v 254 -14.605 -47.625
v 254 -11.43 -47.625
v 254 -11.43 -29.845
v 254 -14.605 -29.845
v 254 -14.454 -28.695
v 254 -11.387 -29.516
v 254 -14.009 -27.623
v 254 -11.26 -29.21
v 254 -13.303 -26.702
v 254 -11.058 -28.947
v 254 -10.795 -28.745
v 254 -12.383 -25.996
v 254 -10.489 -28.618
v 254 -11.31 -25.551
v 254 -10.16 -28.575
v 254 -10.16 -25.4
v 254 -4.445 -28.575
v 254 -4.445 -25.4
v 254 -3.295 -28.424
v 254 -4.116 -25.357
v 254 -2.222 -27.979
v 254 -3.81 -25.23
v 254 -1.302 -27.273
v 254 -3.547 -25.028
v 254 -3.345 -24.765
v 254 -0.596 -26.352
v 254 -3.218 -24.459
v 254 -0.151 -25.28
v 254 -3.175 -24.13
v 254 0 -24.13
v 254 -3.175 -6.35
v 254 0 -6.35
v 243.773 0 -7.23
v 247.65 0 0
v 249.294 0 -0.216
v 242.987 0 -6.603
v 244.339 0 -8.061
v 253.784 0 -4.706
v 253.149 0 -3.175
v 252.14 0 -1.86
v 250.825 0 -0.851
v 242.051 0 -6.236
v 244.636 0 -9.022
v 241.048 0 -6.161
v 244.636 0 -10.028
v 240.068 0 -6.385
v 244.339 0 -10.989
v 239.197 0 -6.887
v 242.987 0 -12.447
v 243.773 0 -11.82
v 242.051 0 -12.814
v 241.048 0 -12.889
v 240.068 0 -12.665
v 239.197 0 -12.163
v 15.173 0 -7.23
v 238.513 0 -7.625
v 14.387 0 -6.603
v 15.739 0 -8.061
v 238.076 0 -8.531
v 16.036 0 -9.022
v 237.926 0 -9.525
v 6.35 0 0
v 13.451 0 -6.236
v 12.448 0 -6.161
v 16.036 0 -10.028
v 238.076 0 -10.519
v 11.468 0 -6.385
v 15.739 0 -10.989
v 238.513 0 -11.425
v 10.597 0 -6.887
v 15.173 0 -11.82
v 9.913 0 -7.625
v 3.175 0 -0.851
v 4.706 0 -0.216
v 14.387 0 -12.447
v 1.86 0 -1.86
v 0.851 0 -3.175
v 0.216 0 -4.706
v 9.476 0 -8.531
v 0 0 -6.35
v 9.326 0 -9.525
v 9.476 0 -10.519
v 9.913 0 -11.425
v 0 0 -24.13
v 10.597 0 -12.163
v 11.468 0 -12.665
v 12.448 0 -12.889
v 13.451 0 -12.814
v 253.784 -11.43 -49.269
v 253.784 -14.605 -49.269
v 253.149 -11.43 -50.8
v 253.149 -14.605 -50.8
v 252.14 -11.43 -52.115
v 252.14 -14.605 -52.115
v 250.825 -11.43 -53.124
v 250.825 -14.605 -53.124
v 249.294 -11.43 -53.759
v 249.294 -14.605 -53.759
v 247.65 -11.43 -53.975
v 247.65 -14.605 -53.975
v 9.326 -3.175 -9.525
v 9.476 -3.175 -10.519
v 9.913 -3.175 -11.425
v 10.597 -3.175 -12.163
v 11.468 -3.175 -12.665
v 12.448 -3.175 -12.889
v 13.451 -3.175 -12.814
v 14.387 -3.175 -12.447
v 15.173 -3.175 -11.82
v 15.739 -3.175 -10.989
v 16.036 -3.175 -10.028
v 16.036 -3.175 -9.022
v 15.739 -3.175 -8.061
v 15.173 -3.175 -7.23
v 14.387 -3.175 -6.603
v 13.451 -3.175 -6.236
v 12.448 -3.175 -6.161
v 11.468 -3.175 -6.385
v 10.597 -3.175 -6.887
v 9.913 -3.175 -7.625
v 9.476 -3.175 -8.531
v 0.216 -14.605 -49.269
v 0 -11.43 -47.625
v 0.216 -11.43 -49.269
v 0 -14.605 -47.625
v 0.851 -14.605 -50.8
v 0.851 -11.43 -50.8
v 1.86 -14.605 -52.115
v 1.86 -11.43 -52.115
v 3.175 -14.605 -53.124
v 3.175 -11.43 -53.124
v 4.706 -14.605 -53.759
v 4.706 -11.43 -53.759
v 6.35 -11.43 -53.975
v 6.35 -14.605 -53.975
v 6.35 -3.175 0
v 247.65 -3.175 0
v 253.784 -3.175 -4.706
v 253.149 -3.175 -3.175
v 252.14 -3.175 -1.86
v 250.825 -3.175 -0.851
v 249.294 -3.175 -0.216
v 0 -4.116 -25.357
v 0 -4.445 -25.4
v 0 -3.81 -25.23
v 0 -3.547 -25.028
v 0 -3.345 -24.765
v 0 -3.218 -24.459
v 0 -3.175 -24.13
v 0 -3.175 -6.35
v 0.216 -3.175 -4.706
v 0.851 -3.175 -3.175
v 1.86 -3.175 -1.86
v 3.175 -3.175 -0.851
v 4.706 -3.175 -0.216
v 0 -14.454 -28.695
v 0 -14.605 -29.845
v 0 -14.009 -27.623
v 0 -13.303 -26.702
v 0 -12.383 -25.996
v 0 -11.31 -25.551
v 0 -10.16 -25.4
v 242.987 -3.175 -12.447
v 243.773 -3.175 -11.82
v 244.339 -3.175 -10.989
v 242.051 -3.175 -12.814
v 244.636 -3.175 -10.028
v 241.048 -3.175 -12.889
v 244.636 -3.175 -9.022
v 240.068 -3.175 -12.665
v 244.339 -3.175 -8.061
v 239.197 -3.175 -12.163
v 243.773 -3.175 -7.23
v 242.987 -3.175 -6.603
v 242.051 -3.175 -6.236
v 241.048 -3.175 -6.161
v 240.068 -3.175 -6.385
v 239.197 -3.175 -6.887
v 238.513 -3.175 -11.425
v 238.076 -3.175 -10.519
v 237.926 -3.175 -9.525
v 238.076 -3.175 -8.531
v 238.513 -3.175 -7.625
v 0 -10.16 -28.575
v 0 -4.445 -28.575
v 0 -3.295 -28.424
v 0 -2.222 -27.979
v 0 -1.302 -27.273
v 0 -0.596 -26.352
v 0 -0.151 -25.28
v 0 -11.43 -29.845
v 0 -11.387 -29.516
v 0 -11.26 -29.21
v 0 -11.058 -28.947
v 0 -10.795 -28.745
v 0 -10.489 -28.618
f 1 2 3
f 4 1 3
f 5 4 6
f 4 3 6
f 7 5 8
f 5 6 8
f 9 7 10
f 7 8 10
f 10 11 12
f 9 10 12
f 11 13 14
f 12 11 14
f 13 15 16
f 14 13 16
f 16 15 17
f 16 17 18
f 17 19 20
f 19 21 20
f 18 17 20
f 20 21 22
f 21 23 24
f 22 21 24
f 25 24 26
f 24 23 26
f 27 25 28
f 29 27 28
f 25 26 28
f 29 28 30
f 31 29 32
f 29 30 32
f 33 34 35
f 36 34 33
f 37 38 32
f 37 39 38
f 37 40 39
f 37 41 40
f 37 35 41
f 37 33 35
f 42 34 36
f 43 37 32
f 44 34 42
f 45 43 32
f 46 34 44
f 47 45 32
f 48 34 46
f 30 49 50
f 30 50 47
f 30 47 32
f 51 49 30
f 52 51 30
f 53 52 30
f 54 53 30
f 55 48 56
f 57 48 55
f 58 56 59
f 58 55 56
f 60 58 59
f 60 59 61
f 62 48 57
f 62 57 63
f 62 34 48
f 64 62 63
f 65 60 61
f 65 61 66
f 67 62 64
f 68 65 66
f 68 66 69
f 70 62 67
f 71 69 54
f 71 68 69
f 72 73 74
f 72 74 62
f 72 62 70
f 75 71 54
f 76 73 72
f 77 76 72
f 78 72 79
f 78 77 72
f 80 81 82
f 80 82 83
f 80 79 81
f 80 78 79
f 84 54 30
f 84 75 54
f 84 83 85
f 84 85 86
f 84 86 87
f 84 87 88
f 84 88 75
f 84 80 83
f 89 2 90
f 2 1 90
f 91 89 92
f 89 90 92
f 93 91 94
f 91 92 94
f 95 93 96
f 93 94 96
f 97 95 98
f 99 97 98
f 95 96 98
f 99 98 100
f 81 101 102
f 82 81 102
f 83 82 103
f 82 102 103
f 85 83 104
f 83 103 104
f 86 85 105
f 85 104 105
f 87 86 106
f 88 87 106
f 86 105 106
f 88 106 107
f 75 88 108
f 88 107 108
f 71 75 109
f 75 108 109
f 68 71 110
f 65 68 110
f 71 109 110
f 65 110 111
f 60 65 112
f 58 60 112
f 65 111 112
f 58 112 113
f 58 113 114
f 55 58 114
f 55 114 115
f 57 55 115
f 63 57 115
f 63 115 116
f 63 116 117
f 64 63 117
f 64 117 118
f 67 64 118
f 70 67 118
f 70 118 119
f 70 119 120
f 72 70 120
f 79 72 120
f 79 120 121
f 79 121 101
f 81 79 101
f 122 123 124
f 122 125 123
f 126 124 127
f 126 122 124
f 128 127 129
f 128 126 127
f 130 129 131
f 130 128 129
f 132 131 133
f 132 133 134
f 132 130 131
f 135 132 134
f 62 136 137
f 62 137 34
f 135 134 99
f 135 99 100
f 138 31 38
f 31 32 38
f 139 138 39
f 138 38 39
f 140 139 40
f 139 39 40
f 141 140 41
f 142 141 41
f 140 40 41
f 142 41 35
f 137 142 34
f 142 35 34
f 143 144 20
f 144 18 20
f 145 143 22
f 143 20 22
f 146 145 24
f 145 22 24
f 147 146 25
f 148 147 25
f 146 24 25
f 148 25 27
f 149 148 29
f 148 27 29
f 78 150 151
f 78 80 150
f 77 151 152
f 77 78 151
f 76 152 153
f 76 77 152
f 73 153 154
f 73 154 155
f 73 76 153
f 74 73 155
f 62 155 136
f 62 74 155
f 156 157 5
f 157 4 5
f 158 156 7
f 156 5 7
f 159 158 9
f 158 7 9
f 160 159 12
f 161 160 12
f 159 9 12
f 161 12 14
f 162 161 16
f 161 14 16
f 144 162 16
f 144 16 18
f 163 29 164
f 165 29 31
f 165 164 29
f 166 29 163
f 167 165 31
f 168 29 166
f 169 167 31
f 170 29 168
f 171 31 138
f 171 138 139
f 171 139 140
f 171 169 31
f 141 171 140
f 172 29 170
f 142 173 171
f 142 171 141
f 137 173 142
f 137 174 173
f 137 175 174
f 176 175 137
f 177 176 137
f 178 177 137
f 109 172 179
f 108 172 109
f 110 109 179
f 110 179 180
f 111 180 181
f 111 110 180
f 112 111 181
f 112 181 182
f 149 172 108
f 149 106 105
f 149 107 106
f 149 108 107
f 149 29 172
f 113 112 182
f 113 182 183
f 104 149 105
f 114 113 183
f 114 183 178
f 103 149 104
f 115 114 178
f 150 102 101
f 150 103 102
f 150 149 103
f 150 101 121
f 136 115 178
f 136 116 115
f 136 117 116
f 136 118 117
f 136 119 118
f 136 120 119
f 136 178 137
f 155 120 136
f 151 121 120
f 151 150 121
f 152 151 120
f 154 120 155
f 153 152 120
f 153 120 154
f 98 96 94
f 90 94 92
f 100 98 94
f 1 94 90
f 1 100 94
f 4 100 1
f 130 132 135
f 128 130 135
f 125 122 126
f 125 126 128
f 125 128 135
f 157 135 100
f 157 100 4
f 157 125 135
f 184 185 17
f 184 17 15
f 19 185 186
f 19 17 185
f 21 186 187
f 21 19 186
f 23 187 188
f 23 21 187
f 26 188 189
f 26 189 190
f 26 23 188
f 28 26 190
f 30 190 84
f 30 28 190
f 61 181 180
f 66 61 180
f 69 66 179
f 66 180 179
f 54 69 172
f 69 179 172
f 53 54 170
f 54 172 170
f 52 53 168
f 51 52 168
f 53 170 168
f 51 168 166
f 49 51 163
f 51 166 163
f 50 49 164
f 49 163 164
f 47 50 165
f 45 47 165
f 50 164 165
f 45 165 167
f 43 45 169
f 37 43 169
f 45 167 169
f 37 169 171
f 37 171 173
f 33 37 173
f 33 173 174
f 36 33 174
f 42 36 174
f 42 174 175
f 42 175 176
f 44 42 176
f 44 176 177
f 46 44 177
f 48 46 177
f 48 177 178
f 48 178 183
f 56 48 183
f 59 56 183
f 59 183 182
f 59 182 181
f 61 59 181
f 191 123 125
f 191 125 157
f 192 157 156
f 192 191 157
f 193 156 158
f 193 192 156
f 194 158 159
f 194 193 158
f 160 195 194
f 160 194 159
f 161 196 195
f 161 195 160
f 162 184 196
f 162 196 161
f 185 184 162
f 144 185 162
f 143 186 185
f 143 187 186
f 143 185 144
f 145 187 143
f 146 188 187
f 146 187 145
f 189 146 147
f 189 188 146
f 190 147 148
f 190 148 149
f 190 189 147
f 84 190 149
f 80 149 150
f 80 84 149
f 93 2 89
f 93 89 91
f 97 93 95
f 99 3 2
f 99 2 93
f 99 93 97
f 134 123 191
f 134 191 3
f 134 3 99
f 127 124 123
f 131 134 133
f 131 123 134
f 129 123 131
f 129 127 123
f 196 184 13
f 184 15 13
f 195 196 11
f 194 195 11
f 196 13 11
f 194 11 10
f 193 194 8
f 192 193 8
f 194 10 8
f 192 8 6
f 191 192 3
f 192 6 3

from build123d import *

# Parameters (mm, degrees)
BOSS_EXTRUDE1_DEPTH              = 254
FILLET1_R                        = 1.27
FILLET2_R                        = 4.445
F_17_64_0_26563_DIAMETER_HOLE1_D = 6.747002
FILLET3_R                        = 6.35


with BuildPart() as part:
    # Sketch1 → Boss-Extrude1 (new body)
    with BuildSketch(Plane(origin=(0, 0, 0), x_dir=(0, 0, -1), z_dir=(1, 0, 0))):
        Polygon((0, 0), (28.575, 0), (28.575, -11.43), (53.975, -11.43), (53.975, -14.605), (25.4, -14.605), (25.4, -3.175), (0, -3.175), align=None)
    extrude(amount=BOSS_EXTRUDE1_DEPTH)

    # Fillet1
    fillet1_edges = [part.edges().sort_by_distance(p)[0] for p in [
        (127, -11.43, -28.575),
        (127, -3.175, -25.4),
    ]]
    fillet(fillet1_edges, radius=FILLET1_R)

    # Fillet2
    fillet2_edges = [part.edges().sort_by_distance(p)[0] for p in [
        (127, 0, -28.575),
        (127, -14.605, -25.4),
    ]]
    fillet(fillet2_edges, radius=FILLET2_R)

    # 17/64 (0.26563) Diameter Hole1 (through all)
    with Locations(Plane(origin=(0, 0, 0), x_dir=(1, 0, 0), z_dir=(0, 1, 0))):
        with Locations((241.3, 9.525), (12.7, 9.525)):
            Hole(F_17_64_0_26563_DIAMETER_HOLE1_D / 2)

    # Fillet3
    fillet3_edges = [part.edges().sort_by_distance(p)[0] for p in [
        (0, -1.5875, 0),
        (254, -13.0175, -53.975),
        (254, -1.5875, 0),
        (0, -13.0175, -53.975),
    ]]
    fillet(fillet3_edges, radius=FILLET3_R)


solid = part.part
